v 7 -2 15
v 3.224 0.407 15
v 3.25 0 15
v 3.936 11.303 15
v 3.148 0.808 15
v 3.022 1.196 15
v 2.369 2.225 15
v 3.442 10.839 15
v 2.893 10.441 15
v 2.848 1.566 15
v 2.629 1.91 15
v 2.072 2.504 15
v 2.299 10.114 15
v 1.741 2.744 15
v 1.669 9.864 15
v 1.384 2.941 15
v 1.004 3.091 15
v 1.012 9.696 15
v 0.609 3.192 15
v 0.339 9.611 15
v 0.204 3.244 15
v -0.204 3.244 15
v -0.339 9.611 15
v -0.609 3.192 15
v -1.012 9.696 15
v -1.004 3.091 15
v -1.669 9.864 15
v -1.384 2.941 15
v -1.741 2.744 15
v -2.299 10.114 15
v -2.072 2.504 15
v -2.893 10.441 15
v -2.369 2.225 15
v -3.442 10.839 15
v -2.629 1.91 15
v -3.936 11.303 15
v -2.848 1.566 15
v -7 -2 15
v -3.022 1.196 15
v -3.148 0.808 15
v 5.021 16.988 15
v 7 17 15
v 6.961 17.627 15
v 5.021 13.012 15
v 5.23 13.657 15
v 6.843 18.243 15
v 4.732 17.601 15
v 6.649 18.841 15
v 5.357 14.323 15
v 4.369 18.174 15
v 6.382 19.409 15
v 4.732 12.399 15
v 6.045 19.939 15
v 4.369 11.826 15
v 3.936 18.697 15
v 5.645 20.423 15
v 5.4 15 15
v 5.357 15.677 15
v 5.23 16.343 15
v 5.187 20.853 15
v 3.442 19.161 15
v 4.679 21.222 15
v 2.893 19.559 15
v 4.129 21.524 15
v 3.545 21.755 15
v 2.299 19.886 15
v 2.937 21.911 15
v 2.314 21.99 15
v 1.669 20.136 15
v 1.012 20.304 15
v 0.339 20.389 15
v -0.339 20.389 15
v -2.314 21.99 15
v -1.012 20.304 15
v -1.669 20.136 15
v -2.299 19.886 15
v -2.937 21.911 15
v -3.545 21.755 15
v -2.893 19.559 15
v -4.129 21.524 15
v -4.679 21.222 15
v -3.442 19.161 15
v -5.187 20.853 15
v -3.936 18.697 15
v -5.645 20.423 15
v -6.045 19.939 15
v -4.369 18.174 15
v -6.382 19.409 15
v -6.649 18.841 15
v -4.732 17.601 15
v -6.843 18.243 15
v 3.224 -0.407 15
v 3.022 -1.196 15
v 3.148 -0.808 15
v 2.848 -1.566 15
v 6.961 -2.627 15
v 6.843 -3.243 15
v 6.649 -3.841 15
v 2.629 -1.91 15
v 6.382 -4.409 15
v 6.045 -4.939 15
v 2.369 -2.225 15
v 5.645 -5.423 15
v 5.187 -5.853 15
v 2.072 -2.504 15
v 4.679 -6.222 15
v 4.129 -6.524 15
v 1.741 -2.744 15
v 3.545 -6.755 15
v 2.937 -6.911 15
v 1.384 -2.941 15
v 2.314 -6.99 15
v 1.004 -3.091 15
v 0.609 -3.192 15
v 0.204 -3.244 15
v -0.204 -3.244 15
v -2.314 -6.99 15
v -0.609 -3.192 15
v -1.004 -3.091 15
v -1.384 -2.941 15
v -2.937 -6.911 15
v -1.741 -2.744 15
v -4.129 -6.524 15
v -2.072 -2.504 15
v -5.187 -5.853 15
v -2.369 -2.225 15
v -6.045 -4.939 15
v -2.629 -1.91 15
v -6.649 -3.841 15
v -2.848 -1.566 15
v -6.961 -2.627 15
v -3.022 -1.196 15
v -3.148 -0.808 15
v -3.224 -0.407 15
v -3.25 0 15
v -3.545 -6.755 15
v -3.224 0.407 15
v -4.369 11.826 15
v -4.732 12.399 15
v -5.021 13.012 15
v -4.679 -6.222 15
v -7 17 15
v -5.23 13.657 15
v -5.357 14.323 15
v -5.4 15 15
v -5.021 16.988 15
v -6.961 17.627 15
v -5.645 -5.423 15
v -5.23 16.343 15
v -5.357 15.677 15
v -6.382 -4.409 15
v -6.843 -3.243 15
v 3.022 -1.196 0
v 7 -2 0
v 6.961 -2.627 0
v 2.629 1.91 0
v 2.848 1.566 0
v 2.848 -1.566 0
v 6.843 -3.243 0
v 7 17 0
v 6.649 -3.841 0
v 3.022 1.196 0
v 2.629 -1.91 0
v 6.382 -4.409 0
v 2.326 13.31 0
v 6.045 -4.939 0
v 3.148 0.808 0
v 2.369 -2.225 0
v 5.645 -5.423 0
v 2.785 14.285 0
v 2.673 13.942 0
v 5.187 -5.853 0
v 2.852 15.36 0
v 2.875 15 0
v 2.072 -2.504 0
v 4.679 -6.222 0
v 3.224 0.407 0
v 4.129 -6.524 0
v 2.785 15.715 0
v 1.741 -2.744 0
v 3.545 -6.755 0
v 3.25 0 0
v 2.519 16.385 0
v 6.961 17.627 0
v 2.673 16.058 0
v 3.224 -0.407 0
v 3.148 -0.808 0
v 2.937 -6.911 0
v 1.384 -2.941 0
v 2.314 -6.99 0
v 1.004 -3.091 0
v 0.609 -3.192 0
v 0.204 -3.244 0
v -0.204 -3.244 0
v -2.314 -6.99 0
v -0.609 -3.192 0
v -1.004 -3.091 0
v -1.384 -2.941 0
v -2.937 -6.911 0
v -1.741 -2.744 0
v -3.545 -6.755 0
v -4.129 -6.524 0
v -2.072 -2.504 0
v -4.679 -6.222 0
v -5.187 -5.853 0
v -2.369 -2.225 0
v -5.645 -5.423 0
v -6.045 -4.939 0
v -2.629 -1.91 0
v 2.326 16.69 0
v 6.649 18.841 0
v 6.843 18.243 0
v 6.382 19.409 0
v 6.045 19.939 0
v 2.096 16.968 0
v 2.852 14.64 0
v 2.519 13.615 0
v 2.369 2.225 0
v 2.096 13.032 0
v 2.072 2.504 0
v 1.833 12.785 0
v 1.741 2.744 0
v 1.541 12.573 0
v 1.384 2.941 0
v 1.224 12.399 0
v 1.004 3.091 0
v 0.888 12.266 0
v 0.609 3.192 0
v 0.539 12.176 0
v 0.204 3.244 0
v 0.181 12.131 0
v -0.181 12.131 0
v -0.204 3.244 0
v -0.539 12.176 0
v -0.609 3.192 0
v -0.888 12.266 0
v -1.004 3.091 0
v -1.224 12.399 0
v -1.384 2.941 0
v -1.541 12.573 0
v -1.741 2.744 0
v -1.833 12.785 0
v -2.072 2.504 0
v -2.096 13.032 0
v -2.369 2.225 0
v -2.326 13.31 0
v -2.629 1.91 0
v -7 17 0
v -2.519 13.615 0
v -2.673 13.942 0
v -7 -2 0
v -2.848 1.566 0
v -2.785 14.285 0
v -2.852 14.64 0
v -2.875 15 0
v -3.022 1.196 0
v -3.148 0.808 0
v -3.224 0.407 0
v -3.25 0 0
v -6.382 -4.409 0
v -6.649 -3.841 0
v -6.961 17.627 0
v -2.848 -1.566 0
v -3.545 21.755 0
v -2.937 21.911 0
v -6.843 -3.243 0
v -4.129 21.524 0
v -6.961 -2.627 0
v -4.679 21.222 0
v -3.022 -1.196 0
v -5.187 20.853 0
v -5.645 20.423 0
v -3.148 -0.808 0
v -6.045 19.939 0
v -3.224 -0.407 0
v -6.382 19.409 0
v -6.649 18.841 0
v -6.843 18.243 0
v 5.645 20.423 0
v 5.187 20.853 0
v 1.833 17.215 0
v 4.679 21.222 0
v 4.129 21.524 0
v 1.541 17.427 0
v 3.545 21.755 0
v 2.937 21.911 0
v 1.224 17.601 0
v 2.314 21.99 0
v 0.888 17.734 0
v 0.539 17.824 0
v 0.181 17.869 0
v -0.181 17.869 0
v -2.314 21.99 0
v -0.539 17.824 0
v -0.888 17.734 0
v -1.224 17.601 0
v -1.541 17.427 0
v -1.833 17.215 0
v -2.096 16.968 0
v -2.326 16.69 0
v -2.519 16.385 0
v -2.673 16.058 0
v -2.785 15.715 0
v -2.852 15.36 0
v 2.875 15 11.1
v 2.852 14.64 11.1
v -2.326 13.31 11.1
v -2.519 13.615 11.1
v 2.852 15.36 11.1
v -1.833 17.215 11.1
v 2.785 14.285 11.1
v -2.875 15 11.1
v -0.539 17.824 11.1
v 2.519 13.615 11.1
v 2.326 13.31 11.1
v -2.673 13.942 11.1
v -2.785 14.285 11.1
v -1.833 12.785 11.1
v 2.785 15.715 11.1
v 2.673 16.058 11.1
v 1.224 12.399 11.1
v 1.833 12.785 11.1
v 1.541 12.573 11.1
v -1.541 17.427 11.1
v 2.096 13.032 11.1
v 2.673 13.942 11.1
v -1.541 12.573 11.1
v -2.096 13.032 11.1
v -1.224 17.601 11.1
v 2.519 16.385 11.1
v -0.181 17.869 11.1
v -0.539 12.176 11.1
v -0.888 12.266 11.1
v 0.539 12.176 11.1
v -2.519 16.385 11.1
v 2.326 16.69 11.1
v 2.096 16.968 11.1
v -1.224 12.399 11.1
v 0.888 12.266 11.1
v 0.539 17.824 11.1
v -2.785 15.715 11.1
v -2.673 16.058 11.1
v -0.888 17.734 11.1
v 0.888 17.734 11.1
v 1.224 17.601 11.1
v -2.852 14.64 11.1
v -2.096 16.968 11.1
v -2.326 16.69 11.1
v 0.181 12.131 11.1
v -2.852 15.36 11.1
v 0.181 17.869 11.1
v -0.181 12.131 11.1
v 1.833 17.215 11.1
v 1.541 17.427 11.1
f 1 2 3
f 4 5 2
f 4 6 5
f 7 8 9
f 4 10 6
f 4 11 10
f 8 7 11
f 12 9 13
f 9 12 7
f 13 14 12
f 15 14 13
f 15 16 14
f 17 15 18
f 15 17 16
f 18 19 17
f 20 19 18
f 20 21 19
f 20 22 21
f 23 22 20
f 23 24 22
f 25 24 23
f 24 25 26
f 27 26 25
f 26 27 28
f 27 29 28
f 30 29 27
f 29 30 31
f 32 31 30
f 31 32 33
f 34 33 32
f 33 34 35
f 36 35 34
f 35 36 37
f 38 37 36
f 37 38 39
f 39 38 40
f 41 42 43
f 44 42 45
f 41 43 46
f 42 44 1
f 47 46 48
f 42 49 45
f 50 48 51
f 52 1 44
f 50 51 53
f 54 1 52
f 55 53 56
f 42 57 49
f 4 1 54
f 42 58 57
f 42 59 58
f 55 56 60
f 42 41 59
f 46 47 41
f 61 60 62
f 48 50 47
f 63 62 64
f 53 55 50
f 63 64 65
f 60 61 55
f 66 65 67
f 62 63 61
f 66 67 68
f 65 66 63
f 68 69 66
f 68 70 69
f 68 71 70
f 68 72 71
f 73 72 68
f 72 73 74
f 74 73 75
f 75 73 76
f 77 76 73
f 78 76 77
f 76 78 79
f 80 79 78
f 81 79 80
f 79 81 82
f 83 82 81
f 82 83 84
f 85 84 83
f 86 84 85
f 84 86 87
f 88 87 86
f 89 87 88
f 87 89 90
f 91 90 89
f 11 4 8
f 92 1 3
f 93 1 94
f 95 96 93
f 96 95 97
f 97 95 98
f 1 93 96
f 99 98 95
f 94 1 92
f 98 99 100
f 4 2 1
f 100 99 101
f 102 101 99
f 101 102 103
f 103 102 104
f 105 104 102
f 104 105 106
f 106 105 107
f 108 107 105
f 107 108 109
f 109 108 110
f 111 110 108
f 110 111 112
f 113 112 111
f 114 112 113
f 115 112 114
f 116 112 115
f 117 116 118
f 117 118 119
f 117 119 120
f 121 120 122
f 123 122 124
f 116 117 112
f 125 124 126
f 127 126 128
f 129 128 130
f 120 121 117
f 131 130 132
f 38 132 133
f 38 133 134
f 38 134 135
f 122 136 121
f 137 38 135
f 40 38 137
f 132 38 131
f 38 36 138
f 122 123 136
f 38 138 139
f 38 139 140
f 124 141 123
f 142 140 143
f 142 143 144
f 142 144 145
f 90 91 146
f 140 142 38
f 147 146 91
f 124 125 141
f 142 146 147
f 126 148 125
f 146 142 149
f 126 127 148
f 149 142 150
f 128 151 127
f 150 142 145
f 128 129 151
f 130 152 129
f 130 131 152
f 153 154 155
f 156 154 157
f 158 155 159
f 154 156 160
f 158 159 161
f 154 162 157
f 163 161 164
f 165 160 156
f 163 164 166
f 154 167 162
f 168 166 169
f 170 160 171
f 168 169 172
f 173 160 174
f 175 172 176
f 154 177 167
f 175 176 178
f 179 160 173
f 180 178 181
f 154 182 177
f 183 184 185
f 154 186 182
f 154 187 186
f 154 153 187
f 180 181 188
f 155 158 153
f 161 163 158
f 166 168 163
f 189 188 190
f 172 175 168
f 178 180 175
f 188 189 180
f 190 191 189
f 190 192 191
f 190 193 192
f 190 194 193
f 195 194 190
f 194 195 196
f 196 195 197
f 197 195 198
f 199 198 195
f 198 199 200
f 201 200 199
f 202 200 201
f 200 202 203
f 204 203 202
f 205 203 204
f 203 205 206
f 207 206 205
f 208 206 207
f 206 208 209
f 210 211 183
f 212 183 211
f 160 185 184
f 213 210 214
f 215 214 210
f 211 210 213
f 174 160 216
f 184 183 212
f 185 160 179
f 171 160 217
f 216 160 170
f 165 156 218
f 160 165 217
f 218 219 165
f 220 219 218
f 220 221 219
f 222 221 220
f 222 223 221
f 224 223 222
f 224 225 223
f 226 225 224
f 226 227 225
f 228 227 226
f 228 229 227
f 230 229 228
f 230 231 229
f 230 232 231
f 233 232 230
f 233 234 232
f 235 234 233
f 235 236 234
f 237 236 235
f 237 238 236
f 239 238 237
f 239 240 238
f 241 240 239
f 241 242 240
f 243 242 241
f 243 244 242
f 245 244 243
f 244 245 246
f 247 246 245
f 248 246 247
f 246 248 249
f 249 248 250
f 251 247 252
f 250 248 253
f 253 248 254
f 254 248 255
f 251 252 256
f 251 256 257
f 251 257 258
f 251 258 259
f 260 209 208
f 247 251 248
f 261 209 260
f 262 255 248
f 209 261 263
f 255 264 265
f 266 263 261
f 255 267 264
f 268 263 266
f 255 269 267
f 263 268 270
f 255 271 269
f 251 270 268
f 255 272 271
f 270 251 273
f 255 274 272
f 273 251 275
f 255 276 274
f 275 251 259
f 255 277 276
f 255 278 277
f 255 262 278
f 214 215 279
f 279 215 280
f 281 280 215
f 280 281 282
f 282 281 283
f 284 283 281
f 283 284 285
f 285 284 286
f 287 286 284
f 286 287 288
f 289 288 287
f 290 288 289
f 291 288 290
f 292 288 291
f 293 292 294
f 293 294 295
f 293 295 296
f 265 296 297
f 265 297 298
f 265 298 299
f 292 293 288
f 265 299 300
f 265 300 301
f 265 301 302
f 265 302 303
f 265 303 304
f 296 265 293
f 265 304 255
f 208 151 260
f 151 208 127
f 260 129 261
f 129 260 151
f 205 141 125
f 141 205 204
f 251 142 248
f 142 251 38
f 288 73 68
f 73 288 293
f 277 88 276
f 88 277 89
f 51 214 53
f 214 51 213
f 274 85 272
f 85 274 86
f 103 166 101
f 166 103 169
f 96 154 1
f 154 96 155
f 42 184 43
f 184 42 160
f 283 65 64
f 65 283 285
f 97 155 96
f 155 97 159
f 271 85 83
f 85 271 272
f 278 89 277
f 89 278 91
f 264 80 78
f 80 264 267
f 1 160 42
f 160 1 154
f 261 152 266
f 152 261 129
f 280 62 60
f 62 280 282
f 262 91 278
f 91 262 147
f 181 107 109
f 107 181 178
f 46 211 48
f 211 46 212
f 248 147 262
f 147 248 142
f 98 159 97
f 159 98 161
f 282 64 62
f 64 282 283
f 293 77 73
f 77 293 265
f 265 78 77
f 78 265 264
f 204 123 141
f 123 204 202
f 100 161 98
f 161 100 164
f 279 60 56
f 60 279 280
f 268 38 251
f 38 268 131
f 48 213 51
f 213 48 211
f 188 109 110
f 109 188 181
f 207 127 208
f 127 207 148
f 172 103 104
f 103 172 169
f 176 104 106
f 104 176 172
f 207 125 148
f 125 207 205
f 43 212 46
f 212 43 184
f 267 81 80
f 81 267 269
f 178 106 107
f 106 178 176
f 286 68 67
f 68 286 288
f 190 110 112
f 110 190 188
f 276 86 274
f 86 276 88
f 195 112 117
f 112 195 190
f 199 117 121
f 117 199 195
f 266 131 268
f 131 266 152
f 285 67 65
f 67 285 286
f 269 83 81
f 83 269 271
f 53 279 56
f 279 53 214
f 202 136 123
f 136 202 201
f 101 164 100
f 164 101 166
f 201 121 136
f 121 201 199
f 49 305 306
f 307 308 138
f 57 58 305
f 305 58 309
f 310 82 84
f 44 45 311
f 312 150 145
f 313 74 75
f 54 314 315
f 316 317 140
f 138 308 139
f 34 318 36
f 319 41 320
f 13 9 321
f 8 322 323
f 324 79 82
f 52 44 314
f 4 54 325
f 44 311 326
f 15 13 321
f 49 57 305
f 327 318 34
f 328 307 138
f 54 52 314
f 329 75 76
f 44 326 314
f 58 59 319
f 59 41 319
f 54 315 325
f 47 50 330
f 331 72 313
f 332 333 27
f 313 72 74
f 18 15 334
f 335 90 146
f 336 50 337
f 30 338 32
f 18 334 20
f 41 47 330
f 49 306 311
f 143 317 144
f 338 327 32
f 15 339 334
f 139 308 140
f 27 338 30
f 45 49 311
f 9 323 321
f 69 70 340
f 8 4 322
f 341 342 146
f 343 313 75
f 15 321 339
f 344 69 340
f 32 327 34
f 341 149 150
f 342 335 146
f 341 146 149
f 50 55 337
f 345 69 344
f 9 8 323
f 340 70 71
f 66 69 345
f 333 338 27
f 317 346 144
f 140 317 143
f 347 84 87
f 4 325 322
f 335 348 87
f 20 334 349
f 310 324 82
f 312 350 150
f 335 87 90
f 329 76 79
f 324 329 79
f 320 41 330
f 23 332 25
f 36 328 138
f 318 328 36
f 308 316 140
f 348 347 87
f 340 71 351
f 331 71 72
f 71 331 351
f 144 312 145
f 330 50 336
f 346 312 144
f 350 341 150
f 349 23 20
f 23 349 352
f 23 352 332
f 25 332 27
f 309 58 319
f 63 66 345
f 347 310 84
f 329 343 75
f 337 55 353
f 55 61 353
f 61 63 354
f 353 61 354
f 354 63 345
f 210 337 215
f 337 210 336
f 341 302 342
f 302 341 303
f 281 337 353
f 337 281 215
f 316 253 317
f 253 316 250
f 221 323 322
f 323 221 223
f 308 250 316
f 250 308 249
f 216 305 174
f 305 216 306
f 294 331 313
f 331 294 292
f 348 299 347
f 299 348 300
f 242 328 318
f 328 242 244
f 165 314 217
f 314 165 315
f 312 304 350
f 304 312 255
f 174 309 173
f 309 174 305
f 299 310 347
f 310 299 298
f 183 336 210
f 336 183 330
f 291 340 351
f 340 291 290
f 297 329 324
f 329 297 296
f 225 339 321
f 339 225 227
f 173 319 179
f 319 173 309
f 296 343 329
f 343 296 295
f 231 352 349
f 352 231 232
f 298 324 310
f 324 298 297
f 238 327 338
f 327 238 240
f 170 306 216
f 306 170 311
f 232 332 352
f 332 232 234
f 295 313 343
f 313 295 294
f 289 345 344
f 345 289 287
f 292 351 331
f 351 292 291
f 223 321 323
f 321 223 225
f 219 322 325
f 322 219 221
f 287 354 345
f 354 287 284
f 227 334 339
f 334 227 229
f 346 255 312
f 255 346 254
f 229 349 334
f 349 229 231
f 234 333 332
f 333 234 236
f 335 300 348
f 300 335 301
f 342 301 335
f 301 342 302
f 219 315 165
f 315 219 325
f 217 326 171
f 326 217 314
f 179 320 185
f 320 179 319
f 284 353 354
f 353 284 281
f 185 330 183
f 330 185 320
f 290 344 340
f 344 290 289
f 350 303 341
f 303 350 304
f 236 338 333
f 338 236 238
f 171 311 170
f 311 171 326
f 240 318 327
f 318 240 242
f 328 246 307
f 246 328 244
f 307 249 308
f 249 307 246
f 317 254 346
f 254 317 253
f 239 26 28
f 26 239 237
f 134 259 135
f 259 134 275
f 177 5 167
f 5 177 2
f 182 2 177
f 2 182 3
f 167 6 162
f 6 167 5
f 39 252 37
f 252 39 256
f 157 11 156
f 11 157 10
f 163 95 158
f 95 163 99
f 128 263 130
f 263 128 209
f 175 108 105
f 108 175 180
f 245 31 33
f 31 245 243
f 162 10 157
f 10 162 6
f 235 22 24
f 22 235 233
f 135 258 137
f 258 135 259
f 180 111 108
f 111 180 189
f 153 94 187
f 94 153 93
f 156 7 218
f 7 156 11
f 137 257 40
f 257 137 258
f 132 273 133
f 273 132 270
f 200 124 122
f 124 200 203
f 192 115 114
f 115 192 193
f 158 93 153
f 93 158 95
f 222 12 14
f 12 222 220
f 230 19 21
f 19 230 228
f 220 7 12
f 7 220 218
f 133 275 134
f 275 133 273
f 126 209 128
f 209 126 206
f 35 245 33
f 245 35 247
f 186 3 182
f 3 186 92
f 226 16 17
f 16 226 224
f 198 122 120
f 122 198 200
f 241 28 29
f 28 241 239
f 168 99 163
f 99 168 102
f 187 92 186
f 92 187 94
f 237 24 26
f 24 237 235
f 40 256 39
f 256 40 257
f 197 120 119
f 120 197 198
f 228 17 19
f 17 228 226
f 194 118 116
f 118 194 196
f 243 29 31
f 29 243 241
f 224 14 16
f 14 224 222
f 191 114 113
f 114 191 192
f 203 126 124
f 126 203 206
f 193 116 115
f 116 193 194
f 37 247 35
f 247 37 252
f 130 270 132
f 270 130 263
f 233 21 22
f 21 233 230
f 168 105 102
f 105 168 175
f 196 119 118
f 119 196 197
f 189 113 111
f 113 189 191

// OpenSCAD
$fn = 50;


difference() {
	union() {
		cylinder(h = 15, r = 7.0000000000);
		translate(v = [0.0000000000, 7.5000000000, 0]) {
			hull() {
				translate(v = [-2.0000000000, 9.5000000000, 0]) {
					cylinder(h = 15, r = 5);
				}
				translate(v = [2.0000000000, 9.5000000000, 0]) {
					cylinder(h = 15, r = 5);
				}
				translate(v = [-2.0000000000, -9.5000000000, 0]) {
					cylinder(h = 15, r = 5);
				}
				translate(v = [2.0000000000, -9.5000000000, 0]) {
					cylinder(h = 15, r = 5);
				}
			}
		}
		translate(v = [0.0000000000, 7.5000000000, 0]) {
			hull() {
				translate(v = [-2.0000000000, 9.5000000000, 0]) {
					cylinder(h = 15, r = 5);
				}
				translate(v = [2.0000000000, 9.5000000000, 0]) {
					cylinder(h = 15, r = 5);
				}
				translate(v = [-2.0000000000, -9.5000000000, 0]) {
					cylinder(h = 15, r = 5);
				}
				translate(v = [2.0000000000, -9.5000000000, 0]) {
					cylinder(h = 15, r = 5);
				}
			}
		}
	}
	union() {
		translate(v = [0.0000000000, 15.0000000000, 15]) {
			rotate(a = [0, 0, 0]) {
				difference() {
					union() {
						#translate(v = [0, 0, -15.0000000000]) {
							cylinder(h = 15, r = 2.6000000000);
						}
						#translate(v = [0, 0, -3.9000000000]) {
							cylinder(h = 3.9000000000, r1 = 2.8750000000, r2 = 5.4000000000);
						}
						#translate(v = [0, 0, -15.0000000000]) {
							cylinder(h = 15, r = 2.8750000000);
						}
						#translate(v = [0, 0, -15.0000000000]) {
							cylinder(h = 15, r = 2.6000000000);
						}
					}
					union();
				}
			}
		}
		translate(v = [0.0000000000, 15.0000000000, 15]) {
			rotate(a = [0, 0, 0]) {
				difference() {
					union() {
						#translate(v = [0, 0, -15.0000000000]) {
							cylinder(h = 15, r = 2.6000000000);
						}
						#translate(v = [0, 0, -3.9000000000]) {
							cylinder(h = 3.9000000000, r1 = 2.8750000000, r2 = 5.4000000000);
						}
						#translate(v = [0, 0, -15.0000000000]) {
							cylinder(h = 15, r = 2.8750000000);
						}
						#translate(v = [0, 0, -15.0000000000]) {
							cylinder(h = 15, r = 2.6000000000);
						}
					}
					union();
				}
			}
		}
		translate(v = [0, 0, -100]) {
			cylinder(h = 200, r = 3.2500000000);
		}
		translate(v = [0, 0, -100]) {
			cylinder(h = 200, r = 1.8000000000);
		}
	}
}
